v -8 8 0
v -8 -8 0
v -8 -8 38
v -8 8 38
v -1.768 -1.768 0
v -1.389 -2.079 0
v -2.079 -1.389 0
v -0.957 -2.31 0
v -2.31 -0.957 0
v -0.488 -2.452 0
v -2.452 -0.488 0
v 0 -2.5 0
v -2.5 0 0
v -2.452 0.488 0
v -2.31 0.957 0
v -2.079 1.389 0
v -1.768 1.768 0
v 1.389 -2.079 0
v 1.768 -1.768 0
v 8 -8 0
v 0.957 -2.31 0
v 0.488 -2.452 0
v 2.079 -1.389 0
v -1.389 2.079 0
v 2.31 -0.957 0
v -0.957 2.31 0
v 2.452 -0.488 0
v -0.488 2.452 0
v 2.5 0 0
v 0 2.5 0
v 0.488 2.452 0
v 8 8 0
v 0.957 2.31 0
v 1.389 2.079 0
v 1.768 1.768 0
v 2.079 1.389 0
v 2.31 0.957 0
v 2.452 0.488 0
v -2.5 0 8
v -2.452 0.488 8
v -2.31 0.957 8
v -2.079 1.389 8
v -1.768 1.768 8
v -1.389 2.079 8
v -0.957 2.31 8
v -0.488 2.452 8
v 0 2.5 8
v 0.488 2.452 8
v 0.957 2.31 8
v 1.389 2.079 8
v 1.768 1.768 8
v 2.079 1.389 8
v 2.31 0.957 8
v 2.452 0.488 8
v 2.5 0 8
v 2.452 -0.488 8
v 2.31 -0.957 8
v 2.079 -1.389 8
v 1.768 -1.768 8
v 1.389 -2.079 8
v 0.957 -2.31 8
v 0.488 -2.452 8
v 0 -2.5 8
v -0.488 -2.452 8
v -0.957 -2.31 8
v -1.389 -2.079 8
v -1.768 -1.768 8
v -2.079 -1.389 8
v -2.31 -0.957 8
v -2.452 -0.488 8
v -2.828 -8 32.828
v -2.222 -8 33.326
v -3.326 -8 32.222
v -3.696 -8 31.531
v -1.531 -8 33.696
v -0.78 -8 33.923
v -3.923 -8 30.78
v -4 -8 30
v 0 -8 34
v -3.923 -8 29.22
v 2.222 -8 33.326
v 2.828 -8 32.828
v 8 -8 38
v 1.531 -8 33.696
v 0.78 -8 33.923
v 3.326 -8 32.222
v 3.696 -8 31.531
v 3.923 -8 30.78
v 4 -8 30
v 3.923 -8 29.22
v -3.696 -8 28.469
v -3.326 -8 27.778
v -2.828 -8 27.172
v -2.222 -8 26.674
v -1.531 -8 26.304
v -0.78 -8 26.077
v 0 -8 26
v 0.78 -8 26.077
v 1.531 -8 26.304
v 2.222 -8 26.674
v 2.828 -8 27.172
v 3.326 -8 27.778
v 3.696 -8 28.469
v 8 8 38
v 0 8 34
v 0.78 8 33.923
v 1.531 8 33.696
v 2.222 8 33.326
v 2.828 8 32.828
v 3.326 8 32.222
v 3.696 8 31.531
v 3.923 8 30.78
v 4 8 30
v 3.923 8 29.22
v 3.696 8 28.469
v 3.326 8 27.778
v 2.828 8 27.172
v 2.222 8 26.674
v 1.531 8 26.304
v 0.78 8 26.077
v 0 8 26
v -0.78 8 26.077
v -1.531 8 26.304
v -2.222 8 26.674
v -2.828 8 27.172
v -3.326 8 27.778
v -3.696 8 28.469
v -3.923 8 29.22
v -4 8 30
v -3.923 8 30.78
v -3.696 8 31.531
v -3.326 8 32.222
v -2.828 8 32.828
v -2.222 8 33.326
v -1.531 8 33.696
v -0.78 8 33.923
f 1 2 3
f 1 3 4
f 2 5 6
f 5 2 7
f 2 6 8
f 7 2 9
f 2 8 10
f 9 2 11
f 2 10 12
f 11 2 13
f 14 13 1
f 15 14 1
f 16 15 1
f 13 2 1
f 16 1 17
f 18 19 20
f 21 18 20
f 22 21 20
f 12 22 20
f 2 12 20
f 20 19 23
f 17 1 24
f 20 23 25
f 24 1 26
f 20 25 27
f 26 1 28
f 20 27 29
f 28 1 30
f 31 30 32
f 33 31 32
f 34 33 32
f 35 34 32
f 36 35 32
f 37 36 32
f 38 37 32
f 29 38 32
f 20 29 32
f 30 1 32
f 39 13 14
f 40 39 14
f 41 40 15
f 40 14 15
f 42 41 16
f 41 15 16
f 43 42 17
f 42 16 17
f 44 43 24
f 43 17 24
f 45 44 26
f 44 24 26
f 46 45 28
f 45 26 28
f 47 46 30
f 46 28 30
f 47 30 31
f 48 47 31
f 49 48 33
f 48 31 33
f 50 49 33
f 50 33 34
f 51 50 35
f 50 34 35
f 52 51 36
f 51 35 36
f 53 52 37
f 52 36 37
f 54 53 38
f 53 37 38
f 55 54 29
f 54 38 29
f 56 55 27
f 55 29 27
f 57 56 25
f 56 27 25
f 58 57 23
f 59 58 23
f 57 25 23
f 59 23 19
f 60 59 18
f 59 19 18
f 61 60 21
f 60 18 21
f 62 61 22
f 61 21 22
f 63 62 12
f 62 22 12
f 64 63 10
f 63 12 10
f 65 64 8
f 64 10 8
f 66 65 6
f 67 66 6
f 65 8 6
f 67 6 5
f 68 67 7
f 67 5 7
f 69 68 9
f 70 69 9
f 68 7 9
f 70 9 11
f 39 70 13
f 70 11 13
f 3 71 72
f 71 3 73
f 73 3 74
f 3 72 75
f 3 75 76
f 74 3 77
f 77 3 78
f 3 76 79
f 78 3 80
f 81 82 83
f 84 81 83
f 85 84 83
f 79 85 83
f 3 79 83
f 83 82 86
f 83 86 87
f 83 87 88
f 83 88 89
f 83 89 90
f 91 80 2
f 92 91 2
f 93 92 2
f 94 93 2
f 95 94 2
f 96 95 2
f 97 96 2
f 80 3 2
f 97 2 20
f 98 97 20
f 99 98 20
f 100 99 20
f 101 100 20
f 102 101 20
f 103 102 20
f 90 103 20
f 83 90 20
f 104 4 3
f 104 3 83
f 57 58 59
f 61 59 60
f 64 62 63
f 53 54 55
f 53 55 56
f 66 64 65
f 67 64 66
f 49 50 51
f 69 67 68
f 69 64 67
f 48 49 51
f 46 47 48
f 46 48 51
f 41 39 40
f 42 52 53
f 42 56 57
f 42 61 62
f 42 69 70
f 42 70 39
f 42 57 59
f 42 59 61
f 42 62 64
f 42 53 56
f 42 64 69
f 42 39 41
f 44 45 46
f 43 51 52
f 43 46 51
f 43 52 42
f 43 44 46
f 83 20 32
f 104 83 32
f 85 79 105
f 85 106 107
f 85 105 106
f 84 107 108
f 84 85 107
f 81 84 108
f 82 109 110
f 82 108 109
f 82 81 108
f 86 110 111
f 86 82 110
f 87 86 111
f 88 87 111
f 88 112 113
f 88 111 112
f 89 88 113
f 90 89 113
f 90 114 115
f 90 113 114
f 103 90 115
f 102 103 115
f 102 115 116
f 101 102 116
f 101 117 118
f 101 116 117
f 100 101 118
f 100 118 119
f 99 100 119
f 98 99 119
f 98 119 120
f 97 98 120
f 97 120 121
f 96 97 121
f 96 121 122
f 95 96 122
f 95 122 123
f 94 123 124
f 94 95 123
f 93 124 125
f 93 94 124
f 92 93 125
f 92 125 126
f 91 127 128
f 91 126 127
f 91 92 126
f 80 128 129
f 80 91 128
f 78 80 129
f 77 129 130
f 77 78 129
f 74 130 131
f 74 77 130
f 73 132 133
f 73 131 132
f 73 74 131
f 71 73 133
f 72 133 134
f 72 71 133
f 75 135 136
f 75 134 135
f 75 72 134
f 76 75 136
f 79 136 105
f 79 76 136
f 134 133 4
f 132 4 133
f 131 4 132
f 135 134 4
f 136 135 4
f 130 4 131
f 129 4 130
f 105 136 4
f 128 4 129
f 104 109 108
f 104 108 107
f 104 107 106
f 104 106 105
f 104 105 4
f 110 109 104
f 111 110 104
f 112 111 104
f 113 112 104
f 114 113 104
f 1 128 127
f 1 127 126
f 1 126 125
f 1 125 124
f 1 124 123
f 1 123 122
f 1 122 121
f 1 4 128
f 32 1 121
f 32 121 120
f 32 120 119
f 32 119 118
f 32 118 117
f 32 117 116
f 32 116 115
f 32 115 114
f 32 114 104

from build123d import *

# Parameters (mm, degrees)
SKETCH1_W                             = 16
SKETCH1_H                             = 16
SHAFT_SUPPORT_DEPTH                   = 38
D8_GUIDE_SHAFT_SEAT_DEPTH             = 40.648455203
D8_GUIDE_SHAFT_SEAT_DEPTH_BACK        = 40.648455203
SKETCH2_R                             = 4
SKETCH3_R                             = 2.5
M5_BOTTOM_THREAD_MAJOR_ENVELOPE_DEPTH = 8


with BuildPart() as part:
    # Sketch1 → Shaft_Support (new body)
    with BuildSketch(Plane.XY):
        Rectangle(SKETCH1_W, SKETCH1_H)
    extrude(amount=SHAFT_SUPPORT_DEPTH)

    # Sketch2 → D8_Guide_Shaft_Seat (cut, two sides: drawn at the far end of the back side and taken through both)
    with BuildSketch(Plane(origin=(0, 0, 0), x_dir=(1, 0, 0), z_dir=(0, 1, 0)).offset(-D8_GUIDE_SHAFT_SEAT_DEPTH_BACK)):
        with Locations(Location((0, -30, 0), (0, 0, 270))):
            Circle(SKETCH2_R)
    extrude(amount=D8_GUIDE_SHAFT_SEAT_DEPTH + D8_GUIDE_SHAFT_SEAT_DEPTH_BACK, mode=Mode.SUBTRACT)

    # Sketch3 → M5_Bottom_Thread_Major_Envelope (cut)
    with BuildSketch(Plane(origin=(0, 0, 0), x_dir=(-1, 0, 0), z_dir=(0, 0, -1))):
        Circle(SKETCH3_R)
    extrude(amount=-M5_BOTTOM_THREAD_MAJOR_ENVELOPE_DEPTH, mode=Mode.SUBTRACT)


solid = part.part
